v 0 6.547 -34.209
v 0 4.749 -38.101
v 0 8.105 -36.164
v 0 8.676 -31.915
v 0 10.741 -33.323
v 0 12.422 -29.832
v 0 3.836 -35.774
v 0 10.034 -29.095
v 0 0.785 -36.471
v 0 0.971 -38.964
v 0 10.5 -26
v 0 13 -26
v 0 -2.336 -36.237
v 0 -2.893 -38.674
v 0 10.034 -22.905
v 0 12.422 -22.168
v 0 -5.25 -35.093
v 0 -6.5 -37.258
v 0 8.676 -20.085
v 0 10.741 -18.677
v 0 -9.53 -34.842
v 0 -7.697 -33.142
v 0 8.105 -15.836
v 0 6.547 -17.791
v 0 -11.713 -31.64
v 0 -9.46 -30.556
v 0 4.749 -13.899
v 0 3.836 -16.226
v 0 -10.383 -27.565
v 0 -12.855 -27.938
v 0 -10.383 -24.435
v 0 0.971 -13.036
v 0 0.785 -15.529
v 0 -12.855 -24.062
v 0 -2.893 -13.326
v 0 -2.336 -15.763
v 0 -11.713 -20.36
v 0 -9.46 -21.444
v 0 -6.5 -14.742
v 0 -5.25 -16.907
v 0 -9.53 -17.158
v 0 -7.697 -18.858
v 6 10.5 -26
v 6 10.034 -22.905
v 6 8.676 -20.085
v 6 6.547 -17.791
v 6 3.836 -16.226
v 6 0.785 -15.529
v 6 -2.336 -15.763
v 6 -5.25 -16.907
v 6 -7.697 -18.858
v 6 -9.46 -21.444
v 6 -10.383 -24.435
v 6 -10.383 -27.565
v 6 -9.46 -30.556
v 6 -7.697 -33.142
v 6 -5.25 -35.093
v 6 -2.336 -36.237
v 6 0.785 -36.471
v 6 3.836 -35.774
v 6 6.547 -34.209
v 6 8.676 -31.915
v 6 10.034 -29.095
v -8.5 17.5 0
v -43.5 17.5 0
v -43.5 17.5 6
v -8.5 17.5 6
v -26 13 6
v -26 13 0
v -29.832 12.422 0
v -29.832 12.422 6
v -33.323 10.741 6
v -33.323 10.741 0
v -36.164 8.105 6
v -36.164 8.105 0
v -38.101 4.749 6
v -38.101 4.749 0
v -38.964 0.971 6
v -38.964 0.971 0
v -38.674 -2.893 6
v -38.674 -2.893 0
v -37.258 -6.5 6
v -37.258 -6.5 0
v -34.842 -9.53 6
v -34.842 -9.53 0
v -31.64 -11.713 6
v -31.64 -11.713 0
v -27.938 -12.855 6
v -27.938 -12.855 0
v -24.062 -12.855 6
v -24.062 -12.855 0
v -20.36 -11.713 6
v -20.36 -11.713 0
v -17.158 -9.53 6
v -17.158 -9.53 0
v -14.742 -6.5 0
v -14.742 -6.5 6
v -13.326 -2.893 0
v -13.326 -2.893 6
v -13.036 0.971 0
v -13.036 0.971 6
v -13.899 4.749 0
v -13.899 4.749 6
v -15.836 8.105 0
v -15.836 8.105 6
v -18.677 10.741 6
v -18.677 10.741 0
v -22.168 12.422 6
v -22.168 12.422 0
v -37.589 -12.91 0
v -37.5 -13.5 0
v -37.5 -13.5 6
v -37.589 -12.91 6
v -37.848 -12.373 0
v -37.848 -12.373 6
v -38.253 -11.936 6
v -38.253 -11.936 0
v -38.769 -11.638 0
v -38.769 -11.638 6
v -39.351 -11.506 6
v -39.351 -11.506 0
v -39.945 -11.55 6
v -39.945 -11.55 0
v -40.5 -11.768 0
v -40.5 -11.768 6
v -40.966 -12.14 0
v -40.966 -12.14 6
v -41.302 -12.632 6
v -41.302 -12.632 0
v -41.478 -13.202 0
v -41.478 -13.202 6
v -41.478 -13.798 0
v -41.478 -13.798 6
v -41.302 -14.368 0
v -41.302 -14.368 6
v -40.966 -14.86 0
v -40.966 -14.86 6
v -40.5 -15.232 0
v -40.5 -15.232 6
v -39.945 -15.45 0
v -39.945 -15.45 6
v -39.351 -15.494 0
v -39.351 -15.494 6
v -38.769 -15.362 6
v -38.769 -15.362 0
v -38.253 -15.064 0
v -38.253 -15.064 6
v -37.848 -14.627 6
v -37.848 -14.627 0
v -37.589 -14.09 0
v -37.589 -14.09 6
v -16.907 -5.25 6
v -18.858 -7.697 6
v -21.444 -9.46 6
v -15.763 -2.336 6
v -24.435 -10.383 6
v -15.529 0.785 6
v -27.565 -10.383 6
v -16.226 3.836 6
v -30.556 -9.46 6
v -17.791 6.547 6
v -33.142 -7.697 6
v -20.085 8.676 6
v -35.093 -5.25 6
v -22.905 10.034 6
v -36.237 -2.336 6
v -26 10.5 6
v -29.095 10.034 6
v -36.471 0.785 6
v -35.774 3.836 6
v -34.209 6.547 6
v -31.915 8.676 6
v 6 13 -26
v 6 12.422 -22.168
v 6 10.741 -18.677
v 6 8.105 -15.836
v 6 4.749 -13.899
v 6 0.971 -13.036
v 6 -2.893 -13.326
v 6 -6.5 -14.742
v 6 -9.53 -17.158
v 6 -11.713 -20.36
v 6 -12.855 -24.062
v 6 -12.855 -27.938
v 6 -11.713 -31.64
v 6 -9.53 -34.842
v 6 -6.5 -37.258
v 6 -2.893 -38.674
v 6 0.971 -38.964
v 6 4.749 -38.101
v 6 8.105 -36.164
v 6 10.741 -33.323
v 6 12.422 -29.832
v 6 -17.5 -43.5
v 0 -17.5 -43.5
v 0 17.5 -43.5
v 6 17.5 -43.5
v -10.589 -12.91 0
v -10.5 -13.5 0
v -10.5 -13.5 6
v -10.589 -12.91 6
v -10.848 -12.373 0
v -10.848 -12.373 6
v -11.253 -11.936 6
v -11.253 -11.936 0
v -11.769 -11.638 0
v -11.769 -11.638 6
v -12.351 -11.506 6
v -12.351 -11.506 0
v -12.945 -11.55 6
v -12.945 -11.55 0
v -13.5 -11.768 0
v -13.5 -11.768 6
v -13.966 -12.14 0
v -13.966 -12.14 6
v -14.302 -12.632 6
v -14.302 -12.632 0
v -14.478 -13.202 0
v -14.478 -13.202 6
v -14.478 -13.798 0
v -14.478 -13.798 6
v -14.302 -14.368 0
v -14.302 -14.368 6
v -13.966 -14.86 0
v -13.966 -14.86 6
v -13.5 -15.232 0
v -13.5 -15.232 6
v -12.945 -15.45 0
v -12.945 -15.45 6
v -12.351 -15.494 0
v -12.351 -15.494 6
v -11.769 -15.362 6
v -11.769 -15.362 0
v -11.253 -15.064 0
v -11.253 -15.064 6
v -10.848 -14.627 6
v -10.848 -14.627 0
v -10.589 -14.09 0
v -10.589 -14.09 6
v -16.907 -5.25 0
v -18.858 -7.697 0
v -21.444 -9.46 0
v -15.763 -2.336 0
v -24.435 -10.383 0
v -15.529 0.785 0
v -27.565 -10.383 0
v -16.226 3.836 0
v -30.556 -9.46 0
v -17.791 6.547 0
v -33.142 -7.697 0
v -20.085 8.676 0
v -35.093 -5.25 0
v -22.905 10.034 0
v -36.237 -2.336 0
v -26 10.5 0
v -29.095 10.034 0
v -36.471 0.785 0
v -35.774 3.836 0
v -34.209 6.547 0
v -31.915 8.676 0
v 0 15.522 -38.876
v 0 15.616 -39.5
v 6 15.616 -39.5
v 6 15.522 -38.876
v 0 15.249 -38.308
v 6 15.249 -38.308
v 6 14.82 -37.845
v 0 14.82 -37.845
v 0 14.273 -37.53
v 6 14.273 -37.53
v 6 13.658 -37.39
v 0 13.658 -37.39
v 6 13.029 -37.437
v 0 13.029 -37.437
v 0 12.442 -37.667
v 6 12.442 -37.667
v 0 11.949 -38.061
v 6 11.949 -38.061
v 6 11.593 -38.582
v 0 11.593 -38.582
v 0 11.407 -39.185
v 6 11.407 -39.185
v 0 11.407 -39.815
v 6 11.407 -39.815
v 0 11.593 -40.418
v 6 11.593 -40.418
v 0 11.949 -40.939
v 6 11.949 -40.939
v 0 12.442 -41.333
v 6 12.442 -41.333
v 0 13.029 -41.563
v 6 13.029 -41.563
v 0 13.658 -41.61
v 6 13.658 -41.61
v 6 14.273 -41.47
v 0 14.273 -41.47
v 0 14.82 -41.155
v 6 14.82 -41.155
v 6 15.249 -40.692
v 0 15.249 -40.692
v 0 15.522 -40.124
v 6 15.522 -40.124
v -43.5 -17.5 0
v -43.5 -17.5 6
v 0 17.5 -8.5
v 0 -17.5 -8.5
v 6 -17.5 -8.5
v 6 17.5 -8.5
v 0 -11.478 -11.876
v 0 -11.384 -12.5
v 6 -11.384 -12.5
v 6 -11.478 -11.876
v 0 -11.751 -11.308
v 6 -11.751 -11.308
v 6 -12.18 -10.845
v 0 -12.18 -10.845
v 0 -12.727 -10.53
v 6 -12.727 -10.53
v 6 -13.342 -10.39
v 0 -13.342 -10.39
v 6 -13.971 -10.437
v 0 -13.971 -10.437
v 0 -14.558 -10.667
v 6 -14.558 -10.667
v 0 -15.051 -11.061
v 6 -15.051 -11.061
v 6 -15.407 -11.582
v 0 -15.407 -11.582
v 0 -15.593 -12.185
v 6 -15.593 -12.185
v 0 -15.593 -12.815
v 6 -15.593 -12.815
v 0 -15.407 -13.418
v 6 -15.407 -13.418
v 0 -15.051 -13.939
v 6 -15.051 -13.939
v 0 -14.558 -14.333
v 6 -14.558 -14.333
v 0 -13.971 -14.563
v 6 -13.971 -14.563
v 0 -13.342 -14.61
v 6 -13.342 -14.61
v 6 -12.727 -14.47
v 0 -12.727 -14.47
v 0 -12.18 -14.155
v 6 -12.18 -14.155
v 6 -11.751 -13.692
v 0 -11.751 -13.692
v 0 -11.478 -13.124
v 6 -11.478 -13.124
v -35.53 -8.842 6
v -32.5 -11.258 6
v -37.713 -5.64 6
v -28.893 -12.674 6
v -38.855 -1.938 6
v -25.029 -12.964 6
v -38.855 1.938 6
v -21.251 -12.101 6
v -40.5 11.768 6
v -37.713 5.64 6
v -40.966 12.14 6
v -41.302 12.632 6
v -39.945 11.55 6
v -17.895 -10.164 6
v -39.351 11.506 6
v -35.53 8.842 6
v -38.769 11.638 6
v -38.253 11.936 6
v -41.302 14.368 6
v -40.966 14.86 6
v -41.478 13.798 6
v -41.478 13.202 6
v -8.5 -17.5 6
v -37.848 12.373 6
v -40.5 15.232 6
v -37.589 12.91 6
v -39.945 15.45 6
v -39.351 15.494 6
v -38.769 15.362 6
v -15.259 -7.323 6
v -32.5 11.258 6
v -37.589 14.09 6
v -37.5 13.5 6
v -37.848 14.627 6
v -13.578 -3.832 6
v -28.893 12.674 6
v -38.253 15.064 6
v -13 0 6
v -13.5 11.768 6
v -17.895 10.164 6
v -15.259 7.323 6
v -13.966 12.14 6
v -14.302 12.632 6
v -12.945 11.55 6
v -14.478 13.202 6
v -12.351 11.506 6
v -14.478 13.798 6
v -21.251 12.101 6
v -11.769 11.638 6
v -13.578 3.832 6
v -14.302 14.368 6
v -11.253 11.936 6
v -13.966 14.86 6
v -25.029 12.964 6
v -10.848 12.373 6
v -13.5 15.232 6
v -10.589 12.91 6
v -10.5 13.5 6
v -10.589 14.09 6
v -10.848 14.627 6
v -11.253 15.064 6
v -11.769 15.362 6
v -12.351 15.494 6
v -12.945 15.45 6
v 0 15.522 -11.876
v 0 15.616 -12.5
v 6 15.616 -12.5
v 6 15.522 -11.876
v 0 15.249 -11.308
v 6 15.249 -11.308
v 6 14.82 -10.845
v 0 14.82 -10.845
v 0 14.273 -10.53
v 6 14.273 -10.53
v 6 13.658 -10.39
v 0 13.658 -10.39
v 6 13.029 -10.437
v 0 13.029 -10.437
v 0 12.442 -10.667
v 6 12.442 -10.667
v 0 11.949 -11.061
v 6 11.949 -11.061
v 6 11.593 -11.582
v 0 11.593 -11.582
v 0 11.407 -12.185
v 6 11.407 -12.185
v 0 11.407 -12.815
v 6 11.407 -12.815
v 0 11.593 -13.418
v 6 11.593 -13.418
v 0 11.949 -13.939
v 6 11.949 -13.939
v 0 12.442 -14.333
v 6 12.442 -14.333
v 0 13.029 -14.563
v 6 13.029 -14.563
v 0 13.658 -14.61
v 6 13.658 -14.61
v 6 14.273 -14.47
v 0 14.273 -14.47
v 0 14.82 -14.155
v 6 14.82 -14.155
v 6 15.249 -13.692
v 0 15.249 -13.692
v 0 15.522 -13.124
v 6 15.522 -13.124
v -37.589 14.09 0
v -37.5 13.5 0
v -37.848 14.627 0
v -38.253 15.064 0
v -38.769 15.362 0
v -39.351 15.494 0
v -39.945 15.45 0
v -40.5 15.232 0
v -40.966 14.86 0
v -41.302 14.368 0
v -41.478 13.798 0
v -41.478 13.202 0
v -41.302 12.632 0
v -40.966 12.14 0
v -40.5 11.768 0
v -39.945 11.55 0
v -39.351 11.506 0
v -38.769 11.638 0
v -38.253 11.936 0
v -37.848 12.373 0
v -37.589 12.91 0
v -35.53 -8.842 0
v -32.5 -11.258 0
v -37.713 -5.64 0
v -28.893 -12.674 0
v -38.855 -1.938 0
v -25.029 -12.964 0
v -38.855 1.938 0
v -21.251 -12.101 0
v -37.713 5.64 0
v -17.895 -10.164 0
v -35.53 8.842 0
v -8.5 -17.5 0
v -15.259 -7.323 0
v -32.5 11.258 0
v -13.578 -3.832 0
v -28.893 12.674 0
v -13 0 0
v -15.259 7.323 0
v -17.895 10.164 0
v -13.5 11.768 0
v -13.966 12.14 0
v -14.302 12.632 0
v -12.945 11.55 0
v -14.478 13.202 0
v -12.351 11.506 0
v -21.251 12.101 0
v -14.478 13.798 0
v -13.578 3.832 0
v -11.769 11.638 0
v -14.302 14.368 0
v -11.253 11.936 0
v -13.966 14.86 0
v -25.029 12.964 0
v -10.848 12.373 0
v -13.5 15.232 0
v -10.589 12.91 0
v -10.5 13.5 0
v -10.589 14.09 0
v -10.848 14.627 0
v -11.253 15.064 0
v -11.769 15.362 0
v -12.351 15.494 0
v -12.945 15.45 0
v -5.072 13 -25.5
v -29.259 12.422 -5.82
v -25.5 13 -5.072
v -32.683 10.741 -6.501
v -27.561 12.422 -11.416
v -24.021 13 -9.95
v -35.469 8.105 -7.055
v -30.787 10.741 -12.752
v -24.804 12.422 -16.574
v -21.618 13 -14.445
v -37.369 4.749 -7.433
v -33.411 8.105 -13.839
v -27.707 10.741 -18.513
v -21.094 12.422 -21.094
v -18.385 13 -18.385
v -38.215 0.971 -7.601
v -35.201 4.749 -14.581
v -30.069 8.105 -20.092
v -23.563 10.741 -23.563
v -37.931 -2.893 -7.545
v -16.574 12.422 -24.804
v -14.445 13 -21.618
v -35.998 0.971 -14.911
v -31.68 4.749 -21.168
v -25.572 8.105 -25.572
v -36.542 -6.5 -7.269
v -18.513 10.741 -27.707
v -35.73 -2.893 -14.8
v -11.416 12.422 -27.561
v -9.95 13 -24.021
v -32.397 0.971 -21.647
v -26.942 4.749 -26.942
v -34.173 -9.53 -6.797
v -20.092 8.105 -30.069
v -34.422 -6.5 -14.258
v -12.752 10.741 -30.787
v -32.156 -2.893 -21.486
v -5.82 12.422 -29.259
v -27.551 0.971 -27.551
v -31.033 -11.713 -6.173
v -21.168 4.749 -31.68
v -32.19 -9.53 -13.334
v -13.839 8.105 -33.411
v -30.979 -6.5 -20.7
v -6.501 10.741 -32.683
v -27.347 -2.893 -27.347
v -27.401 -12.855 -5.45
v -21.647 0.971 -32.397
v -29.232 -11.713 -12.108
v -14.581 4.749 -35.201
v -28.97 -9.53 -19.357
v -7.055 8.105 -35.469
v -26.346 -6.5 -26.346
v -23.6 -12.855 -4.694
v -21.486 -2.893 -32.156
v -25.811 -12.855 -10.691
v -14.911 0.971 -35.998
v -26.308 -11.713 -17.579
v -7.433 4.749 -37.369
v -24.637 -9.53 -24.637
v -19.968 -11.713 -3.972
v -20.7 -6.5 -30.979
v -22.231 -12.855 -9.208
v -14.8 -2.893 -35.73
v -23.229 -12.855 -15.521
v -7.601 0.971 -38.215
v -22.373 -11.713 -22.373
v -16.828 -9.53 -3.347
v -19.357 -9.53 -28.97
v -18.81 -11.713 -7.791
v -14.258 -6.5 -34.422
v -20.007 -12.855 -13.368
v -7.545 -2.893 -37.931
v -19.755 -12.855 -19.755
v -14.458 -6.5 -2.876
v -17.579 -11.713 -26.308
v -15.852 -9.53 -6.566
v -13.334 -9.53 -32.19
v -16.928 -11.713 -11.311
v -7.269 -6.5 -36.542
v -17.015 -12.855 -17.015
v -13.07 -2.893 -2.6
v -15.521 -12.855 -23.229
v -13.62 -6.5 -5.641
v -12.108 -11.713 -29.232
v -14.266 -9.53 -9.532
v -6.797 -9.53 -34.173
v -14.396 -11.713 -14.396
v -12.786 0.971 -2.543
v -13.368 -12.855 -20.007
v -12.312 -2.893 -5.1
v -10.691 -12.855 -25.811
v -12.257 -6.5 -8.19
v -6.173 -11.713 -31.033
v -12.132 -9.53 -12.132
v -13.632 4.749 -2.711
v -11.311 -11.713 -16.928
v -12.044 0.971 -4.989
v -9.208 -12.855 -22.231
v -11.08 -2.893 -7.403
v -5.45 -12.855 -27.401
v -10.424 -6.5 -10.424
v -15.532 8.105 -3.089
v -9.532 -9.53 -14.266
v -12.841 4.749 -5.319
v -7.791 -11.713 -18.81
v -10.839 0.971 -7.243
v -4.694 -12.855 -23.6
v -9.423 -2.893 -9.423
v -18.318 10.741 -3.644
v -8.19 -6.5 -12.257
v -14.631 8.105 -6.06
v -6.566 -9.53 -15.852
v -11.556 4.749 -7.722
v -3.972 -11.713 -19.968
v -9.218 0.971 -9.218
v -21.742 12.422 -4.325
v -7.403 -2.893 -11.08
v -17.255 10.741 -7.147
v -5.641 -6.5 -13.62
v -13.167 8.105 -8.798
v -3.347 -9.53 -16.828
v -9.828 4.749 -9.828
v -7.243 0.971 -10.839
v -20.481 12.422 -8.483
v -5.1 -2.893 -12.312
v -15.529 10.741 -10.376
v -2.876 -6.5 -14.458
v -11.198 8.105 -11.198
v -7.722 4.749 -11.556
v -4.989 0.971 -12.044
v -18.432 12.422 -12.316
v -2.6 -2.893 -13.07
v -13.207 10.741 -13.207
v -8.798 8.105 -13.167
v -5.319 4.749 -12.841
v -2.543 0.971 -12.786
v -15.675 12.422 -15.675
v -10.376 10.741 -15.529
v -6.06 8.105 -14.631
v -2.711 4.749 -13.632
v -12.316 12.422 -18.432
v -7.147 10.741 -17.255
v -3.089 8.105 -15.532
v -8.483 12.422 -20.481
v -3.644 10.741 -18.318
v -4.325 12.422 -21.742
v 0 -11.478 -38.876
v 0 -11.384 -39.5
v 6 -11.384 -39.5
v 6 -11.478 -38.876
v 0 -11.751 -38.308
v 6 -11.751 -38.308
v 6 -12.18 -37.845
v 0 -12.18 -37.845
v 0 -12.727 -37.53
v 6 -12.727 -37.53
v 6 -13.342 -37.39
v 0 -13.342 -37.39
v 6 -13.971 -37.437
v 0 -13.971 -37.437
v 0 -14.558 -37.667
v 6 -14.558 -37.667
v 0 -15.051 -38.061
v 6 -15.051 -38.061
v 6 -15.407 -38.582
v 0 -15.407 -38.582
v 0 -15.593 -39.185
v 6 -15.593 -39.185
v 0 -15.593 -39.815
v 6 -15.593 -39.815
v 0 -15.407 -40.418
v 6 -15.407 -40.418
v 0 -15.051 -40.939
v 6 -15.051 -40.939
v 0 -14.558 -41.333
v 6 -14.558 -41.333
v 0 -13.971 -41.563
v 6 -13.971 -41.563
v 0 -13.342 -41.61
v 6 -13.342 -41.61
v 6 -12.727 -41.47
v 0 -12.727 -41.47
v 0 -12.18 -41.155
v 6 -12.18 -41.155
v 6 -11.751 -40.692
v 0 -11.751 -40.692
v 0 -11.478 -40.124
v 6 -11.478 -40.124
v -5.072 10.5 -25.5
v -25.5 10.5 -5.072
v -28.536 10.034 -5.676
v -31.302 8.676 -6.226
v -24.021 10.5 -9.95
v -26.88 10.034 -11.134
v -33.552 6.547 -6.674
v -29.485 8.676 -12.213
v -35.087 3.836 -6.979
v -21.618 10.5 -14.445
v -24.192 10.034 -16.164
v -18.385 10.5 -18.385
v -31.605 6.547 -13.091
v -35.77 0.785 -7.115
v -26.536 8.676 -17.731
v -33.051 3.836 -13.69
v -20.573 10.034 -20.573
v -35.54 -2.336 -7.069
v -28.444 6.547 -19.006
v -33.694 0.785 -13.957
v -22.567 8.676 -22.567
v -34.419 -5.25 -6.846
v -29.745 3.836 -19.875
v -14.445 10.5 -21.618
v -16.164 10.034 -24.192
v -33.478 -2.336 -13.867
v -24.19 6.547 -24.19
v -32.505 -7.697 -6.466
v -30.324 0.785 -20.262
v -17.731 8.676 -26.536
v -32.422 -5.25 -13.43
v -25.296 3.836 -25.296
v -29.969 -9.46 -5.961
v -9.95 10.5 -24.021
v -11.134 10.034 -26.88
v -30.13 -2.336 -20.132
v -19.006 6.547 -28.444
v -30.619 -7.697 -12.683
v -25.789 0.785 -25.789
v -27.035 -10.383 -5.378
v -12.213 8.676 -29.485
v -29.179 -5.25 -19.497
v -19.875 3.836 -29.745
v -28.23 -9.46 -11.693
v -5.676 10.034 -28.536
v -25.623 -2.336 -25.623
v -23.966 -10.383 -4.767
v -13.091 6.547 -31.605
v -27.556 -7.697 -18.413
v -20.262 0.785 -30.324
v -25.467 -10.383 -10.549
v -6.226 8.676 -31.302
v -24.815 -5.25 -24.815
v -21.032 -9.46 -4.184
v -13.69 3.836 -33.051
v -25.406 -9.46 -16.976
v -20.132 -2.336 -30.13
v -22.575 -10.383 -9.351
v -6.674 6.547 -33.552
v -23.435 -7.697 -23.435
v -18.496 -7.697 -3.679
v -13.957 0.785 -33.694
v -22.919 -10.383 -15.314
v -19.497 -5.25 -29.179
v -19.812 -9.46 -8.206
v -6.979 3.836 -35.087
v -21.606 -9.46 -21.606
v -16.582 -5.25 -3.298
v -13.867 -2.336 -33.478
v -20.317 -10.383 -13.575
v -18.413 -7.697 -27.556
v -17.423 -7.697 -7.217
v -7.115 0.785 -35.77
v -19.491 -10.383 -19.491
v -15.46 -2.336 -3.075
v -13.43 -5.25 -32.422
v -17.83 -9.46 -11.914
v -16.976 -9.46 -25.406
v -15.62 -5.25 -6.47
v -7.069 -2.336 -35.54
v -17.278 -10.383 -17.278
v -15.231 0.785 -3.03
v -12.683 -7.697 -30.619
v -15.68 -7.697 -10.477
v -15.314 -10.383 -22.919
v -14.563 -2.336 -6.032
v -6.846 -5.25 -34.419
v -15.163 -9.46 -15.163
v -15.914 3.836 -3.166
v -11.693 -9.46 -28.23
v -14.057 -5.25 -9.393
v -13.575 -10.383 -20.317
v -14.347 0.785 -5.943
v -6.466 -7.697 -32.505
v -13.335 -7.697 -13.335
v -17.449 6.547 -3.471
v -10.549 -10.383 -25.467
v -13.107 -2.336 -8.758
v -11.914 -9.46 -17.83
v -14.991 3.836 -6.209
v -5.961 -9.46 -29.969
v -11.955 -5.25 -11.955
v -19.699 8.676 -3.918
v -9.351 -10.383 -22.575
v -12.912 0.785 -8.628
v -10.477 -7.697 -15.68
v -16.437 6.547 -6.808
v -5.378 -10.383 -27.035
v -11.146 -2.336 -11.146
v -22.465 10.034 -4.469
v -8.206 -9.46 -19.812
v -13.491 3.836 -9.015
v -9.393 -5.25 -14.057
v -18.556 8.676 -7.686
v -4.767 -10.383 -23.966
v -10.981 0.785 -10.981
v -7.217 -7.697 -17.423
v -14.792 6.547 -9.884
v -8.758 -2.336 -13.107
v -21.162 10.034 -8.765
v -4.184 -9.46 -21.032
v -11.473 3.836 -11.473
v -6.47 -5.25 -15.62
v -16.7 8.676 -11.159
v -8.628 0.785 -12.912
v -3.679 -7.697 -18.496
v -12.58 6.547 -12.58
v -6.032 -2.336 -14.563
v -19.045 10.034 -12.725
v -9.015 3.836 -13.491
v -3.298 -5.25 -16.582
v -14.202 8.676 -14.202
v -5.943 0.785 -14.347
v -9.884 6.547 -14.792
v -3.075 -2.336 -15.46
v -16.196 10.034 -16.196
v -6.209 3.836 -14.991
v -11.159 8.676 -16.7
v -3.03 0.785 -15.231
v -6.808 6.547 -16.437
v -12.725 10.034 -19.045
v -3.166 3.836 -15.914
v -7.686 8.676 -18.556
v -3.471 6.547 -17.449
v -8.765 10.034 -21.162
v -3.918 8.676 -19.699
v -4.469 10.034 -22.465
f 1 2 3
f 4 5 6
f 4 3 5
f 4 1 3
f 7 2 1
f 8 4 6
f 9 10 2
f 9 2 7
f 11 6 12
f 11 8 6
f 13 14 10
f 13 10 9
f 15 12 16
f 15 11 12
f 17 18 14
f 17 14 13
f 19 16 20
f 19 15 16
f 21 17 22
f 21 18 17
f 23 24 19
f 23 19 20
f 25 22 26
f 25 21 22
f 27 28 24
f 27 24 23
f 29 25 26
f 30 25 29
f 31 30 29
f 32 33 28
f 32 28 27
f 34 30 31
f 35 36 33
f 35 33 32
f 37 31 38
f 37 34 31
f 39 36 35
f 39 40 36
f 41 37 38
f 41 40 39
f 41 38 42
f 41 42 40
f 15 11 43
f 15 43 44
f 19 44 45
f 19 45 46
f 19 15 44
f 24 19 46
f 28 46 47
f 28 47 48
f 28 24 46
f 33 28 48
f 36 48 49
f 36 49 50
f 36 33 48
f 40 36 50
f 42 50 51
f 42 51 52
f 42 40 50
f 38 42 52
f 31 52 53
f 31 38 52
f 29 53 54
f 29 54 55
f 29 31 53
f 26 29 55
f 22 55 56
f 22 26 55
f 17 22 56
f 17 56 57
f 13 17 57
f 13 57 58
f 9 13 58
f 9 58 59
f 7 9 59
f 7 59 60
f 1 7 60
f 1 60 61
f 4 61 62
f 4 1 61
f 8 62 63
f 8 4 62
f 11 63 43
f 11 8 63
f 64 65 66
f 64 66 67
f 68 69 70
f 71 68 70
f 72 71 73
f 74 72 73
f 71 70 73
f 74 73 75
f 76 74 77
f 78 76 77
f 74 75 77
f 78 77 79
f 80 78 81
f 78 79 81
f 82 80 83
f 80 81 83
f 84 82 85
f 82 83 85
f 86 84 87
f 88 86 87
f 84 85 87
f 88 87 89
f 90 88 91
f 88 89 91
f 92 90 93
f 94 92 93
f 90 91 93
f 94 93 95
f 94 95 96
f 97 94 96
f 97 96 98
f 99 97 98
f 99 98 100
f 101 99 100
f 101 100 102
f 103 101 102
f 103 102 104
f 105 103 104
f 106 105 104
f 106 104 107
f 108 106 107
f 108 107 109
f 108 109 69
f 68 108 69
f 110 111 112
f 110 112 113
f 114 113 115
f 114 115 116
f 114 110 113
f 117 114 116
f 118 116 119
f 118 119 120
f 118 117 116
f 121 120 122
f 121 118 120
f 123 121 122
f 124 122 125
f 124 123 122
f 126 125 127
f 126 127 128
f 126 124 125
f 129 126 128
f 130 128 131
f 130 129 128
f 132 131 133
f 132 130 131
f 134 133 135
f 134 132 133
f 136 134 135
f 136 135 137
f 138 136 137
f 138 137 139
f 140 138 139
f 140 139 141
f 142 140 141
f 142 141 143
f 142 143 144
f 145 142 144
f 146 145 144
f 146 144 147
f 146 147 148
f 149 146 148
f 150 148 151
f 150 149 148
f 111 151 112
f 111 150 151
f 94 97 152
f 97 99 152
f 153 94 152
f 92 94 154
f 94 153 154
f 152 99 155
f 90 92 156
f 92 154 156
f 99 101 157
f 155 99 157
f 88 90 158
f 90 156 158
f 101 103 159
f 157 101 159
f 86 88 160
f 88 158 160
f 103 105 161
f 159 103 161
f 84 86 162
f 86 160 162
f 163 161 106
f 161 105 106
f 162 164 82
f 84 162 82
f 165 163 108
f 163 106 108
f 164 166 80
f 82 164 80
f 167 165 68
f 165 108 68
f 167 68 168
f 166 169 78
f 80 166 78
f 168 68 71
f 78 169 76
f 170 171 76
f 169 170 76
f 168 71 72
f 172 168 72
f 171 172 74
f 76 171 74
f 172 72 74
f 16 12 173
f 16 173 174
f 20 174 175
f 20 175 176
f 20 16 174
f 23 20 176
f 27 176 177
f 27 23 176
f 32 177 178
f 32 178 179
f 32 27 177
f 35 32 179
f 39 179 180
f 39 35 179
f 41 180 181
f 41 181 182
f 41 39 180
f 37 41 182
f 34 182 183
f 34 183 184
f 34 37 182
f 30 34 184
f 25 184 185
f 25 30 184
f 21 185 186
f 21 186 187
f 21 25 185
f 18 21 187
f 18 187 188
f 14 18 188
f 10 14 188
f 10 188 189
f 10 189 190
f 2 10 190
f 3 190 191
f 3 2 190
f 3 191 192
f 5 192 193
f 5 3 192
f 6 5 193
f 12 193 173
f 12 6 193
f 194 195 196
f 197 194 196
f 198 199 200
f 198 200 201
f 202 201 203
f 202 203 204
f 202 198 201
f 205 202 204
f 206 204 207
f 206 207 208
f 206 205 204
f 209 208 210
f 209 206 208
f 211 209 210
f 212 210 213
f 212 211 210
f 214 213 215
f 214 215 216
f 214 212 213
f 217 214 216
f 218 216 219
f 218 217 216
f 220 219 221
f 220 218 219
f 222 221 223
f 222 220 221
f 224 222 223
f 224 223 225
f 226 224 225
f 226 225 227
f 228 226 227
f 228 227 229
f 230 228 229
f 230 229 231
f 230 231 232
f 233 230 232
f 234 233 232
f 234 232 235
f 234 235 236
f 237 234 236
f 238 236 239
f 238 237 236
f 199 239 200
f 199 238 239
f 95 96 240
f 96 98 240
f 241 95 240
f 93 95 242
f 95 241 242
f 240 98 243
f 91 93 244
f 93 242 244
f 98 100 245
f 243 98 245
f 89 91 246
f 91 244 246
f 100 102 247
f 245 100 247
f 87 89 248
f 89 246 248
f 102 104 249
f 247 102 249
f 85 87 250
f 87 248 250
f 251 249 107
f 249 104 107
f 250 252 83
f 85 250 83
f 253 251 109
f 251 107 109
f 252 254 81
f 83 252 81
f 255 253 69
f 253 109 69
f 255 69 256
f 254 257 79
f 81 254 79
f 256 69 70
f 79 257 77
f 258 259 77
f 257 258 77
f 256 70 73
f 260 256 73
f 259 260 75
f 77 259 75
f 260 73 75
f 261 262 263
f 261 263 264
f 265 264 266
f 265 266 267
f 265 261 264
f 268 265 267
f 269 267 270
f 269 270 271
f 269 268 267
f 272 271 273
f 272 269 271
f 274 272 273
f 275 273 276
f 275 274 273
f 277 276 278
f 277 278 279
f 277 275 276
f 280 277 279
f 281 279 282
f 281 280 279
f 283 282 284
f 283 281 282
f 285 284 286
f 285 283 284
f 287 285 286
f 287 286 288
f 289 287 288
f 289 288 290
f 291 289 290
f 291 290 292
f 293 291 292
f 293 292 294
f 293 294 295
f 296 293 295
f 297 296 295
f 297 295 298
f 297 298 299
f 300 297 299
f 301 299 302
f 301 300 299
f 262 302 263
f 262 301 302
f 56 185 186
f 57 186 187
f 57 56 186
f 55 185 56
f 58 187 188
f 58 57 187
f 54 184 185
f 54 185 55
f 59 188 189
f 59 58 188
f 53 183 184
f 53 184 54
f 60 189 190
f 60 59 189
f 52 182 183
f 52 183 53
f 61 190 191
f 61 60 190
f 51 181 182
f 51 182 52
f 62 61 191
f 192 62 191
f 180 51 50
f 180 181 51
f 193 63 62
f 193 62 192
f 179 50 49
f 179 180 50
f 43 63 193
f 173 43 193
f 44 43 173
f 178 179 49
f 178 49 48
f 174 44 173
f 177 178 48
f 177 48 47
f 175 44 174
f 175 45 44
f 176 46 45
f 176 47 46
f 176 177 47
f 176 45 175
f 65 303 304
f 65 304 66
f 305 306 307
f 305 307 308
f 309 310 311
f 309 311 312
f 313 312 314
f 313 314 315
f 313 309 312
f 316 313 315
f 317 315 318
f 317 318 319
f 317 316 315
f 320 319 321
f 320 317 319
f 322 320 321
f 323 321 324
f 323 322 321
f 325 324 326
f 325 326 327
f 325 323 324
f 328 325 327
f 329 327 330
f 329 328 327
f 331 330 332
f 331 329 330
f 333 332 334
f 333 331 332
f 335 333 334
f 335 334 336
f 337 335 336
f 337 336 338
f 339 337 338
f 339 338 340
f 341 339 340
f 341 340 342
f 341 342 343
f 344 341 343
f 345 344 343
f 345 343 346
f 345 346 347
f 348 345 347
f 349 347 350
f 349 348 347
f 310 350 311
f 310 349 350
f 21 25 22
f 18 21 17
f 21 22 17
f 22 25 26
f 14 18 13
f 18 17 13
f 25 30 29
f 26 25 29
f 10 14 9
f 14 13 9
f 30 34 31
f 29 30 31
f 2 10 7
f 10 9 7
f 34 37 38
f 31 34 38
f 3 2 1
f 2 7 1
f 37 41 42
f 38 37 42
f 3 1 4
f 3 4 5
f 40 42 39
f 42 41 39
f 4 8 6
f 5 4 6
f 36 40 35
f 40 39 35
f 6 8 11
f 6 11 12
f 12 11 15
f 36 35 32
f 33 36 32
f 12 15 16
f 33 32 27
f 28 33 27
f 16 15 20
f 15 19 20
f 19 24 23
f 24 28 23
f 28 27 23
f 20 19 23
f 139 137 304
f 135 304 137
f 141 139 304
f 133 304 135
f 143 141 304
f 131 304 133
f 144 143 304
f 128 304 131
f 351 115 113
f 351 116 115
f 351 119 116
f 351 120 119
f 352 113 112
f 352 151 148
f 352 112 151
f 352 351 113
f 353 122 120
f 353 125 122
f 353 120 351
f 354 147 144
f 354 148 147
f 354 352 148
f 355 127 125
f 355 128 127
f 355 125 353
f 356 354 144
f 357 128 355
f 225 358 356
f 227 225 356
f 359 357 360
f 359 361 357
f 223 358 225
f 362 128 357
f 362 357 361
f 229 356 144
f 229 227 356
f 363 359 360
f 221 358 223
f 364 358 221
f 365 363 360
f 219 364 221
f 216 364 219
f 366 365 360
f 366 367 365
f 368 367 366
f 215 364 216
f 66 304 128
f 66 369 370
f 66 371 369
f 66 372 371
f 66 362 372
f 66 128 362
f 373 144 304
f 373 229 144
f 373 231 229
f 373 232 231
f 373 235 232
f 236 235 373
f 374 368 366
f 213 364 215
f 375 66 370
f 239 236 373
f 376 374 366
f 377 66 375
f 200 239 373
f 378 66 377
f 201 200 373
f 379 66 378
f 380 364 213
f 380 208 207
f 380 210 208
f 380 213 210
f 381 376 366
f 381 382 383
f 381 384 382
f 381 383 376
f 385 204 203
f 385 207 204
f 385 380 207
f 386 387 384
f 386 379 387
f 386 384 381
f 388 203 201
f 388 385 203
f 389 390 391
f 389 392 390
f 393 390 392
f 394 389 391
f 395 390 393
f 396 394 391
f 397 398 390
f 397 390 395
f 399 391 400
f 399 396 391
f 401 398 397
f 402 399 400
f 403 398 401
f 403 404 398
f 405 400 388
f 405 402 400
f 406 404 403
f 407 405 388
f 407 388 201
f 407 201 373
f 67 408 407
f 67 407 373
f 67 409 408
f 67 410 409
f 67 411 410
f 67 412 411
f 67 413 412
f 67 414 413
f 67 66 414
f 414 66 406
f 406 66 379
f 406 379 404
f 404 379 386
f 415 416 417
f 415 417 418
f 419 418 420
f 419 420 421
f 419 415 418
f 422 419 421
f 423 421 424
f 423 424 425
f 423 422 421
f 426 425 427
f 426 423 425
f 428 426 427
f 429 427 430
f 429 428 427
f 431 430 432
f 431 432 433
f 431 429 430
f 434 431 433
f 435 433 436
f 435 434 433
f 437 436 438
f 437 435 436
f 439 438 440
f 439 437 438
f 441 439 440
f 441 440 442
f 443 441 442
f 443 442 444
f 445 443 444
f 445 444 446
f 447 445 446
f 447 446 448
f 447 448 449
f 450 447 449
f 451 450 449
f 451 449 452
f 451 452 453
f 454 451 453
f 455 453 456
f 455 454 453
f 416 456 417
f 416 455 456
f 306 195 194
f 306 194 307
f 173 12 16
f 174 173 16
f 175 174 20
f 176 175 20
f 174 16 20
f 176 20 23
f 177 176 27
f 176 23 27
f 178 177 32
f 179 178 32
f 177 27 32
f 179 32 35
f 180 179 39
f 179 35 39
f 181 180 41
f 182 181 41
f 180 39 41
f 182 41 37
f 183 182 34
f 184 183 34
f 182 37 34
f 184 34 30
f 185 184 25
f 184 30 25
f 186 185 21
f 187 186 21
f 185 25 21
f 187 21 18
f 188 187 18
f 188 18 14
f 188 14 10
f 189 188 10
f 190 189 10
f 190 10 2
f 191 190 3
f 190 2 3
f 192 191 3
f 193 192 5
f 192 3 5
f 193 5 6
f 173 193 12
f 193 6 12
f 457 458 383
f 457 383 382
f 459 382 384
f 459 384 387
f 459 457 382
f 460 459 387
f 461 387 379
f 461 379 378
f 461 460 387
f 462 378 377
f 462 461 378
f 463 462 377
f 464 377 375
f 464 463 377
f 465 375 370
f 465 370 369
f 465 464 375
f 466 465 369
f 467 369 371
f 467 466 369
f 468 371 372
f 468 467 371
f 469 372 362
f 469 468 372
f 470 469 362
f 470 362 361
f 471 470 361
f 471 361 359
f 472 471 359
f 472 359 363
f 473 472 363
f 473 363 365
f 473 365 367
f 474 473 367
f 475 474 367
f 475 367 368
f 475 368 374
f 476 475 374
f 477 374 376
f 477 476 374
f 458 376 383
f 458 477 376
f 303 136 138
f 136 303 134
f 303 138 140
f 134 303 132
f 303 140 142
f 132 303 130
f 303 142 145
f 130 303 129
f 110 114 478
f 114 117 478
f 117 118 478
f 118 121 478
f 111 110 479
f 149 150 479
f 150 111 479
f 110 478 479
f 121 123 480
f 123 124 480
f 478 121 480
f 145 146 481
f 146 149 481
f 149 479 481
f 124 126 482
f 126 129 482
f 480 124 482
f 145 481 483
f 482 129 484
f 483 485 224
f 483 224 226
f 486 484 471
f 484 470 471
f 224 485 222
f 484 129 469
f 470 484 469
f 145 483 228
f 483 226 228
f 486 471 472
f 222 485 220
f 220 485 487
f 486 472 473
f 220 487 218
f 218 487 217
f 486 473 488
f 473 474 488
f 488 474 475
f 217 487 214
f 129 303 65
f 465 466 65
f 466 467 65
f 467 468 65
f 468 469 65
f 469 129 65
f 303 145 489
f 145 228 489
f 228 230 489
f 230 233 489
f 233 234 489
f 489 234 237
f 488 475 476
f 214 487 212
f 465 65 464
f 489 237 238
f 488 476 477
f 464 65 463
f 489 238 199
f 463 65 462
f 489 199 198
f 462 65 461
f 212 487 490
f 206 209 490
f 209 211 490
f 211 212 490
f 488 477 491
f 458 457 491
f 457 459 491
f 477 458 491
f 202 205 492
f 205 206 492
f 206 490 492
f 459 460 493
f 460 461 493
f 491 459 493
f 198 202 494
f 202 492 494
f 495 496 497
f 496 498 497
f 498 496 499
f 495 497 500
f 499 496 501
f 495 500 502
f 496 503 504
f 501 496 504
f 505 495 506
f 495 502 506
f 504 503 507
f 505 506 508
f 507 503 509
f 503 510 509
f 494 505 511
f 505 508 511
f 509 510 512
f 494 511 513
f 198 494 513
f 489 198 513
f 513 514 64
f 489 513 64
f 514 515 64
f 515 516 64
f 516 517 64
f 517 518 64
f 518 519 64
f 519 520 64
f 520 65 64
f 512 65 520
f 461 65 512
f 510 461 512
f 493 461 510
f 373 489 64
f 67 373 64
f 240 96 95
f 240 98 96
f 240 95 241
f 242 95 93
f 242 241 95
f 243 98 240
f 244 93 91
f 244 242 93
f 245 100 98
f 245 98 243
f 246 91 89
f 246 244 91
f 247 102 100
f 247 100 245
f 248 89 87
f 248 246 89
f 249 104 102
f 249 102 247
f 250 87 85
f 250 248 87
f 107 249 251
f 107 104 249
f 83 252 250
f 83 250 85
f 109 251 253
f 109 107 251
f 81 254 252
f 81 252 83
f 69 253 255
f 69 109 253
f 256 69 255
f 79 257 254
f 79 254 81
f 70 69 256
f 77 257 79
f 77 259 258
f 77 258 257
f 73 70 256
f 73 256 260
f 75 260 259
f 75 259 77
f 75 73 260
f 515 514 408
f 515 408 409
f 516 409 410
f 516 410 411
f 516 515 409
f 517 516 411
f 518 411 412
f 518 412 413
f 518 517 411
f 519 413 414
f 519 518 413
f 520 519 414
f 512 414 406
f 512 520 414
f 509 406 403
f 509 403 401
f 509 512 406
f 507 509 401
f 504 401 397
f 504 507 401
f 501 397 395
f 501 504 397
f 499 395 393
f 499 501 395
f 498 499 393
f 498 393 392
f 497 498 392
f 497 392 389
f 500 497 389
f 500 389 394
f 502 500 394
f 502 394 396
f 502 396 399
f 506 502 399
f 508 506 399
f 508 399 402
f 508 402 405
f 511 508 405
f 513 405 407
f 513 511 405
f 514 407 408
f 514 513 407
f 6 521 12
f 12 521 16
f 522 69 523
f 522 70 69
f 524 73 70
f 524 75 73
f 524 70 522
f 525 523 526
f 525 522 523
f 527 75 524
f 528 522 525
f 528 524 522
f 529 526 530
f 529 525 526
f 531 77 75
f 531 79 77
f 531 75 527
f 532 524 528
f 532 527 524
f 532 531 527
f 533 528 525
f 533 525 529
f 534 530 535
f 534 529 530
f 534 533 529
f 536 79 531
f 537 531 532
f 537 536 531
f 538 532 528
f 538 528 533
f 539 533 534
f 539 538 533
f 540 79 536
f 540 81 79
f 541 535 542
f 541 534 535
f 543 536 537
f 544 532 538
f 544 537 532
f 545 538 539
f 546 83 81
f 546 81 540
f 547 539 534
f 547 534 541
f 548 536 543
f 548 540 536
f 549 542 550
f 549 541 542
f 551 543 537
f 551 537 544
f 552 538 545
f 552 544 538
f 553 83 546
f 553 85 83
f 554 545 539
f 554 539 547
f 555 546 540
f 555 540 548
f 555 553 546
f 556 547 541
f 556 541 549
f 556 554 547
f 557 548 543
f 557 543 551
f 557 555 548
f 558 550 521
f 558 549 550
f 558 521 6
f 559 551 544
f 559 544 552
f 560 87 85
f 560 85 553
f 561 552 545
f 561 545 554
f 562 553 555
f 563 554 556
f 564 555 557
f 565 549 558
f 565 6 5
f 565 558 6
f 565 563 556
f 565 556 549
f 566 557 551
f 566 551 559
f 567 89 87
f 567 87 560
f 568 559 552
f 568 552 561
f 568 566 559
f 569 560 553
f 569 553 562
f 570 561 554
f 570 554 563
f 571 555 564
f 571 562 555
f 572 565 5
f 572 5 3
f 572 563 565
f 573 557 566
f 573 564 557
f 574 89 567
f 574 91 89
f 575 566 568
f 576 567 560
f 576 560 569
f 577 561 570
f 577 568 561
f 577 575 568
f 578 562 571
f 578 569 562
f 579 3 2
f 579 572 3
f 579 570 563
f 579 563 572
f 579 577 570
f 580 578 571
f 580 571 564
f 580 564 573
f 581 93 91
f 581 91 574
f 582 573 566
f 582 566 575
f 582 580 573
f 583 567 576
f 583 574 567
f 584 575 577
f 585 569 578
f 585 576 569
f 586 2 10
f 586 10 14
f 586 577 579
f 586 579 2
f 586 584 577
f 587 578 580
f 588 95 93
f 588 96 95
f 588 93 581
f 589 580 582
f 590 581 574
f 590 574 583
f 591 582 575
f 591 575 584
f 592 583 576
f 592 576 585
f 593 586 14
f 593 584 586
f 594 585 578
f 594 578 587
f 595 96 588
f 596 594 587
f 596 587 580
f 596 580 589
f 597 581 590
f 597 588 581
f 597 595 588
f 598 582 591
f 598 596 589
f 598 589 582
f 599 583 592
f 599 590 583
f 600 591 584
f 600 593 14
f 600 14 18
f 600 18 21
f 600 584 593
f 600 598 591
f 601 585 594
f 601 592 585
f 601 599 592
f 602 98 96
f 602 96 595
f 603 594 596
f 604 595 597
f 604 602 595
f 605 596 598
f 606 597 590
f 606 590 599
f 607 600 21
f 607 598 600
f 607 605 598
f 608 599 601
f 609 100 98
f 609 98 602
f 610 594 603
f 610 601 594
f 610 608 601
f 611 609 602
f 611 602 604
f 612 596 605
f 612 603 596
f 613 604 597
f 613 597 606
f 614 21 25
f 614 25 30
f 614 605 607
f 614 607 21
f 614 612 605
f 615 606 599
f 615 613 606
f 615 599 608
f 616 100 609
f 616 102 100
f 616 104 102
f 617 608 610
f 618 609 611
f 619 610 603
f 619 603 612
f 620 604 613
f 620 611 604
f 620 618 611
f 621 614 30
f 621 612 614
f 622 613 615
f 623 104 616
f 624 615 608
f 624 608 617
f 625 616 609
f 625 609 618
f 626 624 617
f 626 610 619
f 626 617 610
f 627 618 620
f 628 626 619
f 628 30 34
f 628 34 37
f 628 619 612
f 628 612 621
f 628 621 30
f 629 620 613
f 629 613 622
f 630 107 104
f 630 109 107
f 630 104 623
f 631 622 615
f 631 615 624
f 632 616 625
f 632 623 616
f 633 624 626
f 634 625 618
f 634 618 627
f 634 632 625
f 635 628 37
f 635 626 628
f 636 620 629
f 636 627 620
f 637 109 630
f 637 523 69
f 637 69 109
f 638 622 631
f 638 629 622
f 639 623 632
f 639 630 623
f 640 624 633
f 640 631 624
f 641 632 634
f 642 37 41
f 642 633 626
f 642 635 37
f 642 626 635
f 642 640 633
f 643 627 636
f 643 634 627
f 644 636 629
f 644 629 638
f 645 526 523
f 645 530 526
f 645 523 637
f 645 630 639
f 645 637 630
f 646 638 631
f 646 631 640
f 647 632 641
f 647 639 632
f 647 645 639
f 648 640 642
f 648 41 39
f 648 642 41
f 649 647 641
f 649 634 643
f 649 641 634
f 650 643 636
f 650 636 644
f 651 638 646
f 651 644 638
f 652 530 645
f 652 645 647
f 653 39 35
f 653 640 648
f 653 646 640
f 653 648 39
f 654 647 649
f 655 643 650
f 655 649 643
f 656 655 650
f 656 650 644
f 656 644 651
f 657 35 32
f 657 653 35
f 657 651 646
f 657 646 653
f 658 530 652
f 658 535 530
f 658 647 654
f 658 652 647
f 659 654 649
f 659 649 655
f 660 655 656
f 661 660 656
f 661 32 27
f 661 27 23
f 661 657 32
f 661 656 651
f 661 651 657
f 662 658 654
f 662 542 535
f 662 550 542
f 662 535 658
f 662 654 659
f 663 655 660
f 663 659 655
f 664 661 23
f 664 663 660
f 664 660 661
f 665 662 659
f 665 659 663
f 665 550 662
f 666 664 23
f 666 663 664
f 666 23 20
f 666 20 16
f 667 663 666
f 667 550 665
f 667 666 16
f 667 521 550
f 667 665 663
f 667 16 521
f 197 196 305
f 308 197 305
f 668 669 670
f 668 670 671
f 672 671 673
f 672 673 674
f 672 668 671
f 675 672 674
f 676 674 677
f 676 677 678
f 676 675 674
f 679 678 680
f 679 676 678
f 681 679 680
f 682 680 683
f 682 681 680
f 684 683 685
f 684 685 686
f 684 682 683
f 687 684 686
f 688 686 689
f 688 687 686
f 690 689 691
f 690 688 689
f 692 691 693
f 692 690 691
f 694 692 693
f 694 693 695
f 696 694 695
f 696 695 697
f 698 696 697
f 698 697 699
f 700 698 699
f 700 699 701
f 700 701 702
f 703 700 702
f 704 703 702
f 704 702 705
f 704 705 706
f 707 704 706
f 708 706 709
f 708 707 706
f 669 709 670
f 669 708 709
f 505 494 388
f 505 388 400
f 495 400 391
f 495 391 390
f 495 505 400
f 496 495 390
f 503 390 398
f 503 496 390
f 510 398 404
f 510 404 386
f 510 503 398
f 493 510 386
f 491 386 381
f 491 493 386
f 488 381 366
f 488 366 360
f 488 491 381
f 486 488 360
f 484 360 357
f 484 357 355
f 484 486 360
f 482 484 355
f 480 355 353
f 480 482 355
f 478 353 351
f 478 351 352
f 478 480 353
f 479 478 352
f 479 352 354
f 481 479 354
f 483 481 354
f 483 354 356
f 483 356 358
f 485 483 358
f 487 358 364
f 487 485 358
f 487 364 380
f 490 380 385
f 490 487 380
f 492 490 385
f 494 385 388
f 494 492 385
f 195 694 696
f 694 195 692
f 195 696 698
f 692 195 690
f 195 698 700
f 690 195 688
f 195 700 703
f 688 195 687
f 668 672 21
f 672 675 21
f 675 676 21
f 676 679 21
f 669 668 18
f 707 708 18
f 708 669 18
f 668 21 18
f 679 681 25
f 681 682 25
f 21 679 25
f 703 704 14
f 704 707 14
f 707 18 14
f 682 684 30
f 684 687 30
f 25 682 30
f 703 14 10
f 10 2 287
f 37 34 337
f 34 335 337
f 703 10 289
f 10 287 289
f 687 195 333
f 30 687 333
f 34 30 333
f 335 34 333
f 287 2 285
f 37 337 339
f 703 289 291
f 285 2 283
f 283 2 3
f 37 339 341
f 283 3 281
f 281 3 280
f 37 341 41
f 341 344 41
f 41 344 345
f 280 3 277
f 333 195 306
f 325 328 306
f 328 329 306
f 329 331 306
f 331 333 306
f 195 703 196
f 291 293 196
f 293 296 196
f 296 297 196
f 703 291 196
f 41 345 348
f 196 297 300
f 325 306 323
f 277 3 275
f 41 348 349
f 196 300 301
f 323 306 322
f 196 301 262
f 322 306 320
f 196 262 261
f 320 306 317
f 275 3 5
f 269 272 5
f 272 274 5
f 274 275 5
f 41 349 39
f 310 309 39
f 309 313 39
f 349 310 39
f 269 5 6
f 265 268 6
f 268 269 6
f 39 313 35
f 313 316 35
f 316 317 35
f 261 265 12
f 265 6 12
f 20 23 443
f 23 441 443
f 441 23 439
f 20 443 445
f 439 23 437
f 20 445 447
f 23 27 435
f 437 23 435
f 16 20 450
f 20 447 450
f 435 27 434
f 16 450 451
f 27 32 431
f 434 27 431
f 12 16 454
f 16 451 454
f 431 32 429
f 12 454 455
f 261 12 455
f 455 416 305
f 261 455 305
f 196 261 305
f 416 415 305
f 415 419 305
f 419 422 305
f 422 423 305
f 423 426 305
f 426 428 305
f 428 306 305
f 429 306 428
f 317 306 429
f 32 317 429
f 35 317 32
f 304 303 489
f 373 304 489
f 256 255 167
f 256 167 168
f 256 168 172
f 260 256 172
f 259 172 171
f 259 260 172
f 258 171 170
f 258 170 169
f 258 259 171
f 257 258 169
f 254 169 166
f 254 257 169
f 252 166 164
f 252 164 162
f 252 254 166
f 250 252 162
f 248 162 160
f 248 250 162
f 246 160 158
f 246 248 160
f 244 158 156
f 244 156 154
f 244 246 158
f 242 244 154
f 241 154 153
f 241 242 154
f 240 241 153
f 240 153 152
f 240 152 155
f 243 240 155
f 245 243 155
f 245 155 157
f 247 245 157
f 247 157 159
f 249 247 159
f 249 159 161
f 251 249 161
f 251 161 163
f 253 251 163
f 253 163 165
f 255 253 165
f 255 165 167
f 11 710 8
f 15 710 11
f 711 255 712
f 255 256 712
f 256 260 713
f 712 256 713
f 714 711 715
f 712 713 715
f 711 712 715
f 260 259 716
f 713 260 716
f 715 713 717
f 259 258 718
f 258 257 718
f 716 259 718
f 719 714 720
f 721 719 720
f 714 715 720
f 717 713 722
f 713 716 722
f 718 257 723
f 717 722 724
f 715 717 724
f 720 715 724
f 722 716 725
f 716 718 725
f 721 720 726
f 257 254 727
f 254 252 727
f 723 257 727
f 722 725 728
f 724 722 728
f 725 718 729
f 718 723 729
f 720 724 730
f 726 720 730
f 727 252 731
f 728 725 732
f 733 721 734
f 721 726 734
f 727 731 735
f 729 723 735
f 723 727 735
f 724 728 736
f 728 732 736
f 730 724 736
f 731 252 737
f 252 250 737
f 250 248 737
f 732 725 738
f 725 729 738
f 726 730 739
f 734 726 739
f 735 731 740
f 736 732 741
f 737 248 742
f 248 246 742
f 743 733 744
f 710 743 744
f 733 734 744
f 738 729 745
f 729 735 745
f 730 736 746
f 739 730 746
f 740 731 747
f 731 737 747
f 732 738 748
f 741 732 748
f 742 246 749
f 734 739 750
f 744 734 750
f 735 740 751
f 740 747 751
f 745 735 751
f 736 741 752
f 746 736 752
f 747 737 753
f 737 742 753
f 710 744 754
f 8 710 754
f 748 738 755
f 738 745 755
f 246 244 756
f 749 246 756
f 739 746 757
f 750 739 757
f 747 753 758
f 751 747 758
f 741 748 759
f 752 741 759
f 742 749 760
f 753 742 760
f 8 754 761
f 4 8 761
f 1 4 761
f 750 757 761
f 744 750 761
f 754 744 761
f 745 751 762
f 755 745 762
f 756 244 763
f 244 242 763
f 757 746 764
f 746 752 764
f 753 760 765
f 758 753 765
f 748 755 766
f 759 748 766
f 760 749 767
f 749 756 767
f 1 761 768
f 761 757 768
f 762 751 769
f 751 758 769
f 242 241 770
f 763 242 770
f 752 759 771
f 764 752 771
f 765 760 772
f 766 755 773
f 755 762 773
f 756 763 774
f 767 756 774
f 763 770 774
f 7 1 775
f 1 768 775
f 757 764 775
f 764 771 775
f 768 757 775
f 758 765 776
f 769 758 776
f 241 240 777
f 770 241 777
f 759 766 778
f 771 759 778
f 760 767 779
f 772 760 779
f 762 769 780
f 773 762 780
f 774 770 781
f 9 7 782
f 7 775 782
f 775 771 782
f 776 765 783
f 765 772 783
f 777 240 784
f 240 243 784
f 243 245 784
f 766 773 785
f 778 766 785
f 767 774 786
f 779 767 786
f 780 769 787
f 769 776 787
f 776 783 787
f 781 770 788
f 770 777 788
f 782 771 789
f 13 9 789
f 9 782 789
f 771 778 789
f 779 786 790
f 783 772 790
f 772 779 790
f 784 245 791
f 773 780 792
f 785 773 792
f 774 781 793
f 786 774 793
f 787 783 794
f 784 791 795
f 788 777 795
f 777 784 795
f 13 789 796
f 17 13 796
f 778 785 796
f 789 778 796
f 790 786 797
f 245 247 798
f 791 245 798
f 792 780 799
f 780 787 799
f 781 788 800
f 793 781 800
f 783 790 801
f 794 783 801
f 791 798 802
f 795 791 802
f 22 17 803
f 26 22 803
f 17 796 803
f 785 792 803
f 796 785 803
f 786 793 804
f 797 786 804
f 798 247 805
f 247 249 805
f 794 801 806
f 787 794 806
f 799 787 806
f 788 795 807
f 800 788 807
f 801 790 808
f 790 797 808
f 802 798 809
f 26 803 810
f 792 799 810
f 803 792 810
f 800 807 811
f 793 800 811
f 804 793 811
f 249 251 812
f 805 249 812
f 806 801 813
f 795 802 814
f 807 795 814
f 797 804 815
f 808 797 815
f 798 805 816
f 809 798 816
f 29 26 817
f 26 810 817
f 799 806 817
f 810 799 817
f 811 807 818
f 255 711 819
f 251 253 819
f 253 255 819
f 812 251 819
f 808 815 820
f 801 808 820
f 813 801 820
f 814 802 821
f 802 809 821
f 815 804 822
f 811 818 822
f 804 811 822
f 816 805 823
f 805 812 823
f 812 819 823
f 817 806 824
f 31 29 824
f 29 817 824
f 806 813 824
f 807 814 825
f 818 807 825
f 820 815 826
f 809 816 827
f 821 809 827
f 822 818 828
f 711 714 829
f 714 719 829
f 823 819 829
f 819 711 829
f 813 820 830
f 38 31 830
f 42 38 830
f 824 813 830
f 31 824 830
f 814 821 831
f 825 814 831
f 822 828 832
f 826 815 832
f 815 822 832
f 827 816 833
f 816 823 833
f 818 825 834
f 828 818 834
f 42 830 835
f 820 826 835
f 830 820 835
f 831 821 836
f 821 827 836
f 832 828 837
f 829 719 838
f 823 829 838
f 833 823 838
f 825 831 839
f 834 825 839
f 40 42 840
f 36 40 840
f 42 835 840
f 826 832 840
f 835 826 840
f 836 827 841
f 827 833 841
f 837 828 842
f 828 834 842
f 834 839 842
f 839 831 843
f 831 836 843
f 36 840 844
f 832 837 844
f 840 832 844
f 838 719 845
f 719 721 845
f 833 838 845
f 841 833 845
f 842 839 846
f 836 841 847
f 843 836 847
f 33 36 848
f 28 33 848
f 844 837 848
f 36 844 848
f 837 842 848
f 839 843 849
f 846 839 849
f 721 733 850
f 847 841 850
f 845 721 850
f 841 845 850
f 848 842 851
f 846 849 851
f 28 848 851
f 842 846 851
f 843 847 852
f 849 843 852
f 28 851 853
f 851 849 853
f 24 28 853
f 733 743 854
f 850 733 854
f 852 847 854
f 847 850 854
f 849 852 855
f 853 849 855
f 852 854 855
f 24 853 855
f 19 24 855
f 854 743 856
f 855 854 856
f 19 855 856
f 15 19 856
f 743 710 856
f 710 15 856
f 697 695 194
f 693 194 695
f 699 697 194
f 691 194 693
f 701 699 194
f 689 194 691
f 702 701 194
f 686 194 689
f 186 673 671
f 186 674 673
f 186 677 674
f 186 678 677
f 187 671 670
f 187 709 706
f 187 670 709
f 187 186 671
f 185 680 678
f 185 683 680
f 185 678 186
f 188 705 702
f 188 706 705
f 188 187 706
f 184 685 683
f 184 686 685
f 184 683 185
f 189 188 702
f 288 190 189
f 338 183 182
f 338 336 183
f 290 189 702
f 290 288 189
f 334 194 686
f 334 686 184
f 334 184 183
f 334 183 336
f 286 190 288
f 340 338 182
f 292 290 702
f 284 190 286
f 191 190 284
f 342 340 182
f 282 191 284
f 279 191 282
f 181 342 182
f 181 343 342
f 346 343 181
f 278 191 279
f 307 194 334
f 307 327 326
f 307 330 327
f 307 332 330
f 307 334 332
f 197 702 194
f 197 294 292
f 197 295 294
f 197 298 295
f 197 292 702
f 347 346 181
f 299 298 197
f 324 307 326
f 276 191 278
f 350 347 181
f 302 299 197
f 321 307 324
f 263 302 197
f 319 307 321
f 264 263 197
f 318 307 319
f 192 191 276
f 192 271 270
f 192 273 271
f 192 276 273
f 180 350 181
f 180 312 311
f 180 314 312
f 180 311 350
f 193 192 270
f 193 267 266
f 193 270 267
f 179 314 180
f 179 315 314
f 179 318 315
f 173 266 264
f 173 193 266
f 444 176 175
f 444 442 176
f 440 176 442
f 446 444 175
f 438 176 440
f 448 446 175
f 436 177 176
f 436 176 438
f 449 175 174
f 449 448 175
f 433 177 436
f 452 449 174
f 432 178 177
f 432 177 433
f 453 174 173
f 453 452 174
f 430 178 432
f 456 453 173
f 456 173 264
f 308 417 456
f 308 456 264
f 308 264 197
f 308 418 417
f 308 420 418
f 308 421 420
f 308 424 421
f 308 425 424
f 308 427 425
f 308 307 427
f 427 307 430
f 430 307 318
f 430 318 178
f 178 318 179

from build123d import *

# Parameters (mm, degrees)
F2_R     = 13
F2_R_2   = 10.5
F1_W     = 35
F1_H     = 35
F1_R     = 2
F1_R_2   = 13
F4_DEPTH = 6
F5_DEPTH = 6
F2_W     = 35
F2_H     = 35
F2_R_3   = 2.1163418651
F6_DEPTH = 6
F7_DEPTH = 6


with BuildPart() as f3:
    # F3: sweep along a path in F0
    with BuildLine(Plane.XZ) as f3_path:
        ThreePointArc((-26, 0), (-18.3847763109, -18.3847763109), (0, -26))
    # F2 (on Right) → F3 (sweep)
    with BuildSketch(Plane.YZ):
        with Locations((0, -26)):
            Circle(F2_R)
        with Locations((0, -26)):
            Circle(F2_R_2, mode=Mode.SUBTRACT)
    sweep(path=f3_path.line)


with BuildPart() as f4:
    # F1 (on Top) → F4 (new body)
    with BuildSketch(Plane.XY):
        with Locations((-26, -7.45e-08)):
            Rectangle(F1_W, F1_H)
        with Locations((-39.500000115, -13.4999998105)):
            Circle(F1_R, mode=Mode.SUBTRACT)
        with Locations((-12.500000115, -13.5000000404)):
            Circle(F1_R, mode=Mode.SUBTRACT)
        with Locations((-39.5, 13.4999999255)):
            Circle(F1_R, mode=Mode.SUBTRACT)
        with Locations((-26, 0)):
            Circle(F1_R_2, mode=Mode.SUBTRACT)
        with Locations((-12.5, 13.4999999255)):
            Circle(F1_R, mode=Mode.SUBTRACT)
    extrude(amount=F4_DEPTH)


with BuildPart() as f5:
    # F5 (new): a face of the model
    f5_faces = [f3.part.faces().sort_by_distance(p)[0] for p in [
        (-26, -12.6323044738, 0),
    ]]
    extrude(f5_faces, amount=F5_DEPTH)


with BuildPart() as f6:
    # F2 (on Right) → F6 (new body)
    with BuildSketch(Plane.YZ):
        with Locations((7.45e-08, -26)):
            Rectangle(F2_W, F2_H)
        with Locations((-13.4999999255, -39.5)):
            Circle(F2_R_3, mode=Mode.SUBTRACT)
        with Locations((13.5000000404, -39.499999885)):
            Circle(F2_R_3, mode=Mode.SUBTRACT)
        with Locations((0, -26)):
            Circle(F2_R, mode=Mode.SUBTRACT)
        with Locations((-13.4999999255, -12.5)):
            Circle(F2_R_3, mode=Mode.SUBTRACT)
        with Locations((13.5000000404, -12.500000115)):
            Circle(F2_R_3, mode=Mode.SUBTRACT)
    extrude(amount=F6_DEPTH)


with BuildPart() as f7:
    # F2 (on Right) → F7 (new body)
    with BuildSketch(Plane.YZ):
        with Locations((0, -26)):
            Circle(F2_R)
        with Locations((0, -26)):
            Circle(F2_R_2, mode=Mode.SUBTRACT)
    extrude(amount=F7_DEPTH)


solid = Compound([f3.part, f4.part, f5.part, f6.part, f7.part])
